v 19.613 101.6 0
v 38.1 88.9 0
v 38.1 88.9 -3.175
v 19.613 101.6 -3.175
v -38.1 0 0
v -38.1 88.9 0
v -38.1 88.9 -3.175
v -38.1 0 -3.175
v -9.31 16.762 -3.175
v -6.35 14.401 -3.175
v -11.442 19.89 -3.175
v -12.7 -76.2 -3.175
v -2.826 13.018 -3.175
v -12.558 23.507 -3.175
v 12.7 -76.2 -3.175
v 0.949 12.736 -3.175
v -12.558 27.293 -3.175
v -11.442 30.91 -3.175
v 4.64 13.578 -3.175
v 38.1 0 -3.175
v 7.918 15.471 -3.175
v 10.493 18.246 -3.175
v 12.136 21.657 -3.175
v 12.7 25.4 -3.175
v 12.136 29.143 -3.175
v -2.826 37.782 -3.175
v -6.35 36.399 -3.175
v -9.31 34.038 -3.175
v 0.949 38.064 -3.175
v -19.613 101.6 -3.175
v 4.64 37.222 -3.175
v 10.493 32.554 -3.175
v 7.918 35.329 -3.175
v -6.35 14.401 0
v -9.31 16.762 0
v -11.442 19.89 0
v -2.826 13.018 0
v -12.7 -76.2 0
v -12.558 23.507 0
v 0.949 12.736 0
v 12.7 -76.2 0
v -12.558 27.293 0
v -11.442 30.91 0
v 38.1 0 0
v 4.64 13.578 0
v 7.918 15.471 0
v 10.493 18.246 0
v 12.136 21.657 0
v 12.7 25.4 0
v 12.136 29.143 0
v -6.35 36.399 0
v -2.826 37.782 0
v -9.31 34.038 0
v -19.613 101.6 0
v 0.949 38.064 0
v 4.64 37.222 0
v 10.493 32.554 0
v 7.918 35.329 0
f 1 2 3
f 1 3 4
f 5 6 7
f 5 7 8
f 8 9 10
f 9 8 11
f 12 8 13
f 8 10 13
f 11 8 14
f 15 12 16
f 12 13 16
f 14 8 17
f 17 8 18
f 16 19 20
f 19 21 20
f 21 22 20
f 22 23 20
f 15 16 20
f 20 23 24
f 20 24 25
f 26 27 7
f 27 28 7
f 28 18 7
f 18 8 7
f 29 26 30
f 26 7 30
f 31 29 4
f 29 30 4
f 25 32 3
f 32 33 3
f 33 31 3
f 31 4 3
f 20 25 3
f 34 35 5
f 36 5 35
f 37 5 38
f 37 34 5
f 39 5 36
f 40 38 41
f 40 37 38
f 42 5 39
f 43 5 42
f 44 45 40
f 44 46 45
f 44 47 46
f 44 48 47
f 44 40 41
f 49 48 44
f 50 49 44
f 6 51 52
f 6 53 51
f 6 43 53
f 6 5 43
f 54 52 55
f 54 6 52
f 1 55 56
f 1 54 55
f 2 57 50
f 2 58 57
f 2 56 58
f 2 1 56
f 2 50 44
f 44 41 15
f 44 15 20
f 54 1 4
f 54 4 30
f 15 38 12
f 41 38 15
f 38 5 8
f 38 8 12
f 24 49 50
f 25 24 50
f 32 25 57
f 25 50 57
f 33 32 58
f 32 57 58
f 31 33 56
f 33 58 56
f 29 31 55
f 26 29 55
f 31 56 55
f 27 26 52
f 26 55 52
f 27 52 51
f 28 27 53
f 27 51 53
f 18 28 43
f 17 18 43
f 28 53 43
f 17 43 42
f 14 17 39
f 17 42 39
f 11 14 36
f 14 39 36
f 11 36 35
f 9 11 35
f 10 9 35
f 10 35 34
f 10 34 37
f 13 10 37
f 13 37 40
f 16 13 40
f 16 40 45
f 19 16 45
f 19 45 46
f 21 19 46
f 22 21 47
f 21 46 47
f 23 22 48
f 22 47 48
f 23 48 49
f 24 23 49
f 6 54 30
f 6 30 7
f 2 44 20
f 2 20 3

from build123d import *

# Parameters (mm, degrees)
F0_R     = 12.7
F1_DEPTH = 3.175


# Not quite as in the source:
# - a length typed as a fraction of an inch, garbled in the dataset ("3 / 203.2 mm" for 3/8 in), is restored


with BuildPart() as f1:
    # F0 (on Top) → F1 (new body)
    with BuildSketch(Plane.XY):
        Polygon((-38.1, 0), (-12.7, -76.2), (12.7, -76.2), (38.1, 0), (38.1, 50.8), (38.1, 88.9), (19.6133758873, 101.6), (-19.6133758873, 101.6), (-38.1, 88.9), (-38.1, 50.8), align=None)
        with Locations((0, 25.4)):
            Circle(F0_R, mode=Mode.SUBTRACT)
    extrude(amount=-F1_DEPTH)


solid = f1.part
